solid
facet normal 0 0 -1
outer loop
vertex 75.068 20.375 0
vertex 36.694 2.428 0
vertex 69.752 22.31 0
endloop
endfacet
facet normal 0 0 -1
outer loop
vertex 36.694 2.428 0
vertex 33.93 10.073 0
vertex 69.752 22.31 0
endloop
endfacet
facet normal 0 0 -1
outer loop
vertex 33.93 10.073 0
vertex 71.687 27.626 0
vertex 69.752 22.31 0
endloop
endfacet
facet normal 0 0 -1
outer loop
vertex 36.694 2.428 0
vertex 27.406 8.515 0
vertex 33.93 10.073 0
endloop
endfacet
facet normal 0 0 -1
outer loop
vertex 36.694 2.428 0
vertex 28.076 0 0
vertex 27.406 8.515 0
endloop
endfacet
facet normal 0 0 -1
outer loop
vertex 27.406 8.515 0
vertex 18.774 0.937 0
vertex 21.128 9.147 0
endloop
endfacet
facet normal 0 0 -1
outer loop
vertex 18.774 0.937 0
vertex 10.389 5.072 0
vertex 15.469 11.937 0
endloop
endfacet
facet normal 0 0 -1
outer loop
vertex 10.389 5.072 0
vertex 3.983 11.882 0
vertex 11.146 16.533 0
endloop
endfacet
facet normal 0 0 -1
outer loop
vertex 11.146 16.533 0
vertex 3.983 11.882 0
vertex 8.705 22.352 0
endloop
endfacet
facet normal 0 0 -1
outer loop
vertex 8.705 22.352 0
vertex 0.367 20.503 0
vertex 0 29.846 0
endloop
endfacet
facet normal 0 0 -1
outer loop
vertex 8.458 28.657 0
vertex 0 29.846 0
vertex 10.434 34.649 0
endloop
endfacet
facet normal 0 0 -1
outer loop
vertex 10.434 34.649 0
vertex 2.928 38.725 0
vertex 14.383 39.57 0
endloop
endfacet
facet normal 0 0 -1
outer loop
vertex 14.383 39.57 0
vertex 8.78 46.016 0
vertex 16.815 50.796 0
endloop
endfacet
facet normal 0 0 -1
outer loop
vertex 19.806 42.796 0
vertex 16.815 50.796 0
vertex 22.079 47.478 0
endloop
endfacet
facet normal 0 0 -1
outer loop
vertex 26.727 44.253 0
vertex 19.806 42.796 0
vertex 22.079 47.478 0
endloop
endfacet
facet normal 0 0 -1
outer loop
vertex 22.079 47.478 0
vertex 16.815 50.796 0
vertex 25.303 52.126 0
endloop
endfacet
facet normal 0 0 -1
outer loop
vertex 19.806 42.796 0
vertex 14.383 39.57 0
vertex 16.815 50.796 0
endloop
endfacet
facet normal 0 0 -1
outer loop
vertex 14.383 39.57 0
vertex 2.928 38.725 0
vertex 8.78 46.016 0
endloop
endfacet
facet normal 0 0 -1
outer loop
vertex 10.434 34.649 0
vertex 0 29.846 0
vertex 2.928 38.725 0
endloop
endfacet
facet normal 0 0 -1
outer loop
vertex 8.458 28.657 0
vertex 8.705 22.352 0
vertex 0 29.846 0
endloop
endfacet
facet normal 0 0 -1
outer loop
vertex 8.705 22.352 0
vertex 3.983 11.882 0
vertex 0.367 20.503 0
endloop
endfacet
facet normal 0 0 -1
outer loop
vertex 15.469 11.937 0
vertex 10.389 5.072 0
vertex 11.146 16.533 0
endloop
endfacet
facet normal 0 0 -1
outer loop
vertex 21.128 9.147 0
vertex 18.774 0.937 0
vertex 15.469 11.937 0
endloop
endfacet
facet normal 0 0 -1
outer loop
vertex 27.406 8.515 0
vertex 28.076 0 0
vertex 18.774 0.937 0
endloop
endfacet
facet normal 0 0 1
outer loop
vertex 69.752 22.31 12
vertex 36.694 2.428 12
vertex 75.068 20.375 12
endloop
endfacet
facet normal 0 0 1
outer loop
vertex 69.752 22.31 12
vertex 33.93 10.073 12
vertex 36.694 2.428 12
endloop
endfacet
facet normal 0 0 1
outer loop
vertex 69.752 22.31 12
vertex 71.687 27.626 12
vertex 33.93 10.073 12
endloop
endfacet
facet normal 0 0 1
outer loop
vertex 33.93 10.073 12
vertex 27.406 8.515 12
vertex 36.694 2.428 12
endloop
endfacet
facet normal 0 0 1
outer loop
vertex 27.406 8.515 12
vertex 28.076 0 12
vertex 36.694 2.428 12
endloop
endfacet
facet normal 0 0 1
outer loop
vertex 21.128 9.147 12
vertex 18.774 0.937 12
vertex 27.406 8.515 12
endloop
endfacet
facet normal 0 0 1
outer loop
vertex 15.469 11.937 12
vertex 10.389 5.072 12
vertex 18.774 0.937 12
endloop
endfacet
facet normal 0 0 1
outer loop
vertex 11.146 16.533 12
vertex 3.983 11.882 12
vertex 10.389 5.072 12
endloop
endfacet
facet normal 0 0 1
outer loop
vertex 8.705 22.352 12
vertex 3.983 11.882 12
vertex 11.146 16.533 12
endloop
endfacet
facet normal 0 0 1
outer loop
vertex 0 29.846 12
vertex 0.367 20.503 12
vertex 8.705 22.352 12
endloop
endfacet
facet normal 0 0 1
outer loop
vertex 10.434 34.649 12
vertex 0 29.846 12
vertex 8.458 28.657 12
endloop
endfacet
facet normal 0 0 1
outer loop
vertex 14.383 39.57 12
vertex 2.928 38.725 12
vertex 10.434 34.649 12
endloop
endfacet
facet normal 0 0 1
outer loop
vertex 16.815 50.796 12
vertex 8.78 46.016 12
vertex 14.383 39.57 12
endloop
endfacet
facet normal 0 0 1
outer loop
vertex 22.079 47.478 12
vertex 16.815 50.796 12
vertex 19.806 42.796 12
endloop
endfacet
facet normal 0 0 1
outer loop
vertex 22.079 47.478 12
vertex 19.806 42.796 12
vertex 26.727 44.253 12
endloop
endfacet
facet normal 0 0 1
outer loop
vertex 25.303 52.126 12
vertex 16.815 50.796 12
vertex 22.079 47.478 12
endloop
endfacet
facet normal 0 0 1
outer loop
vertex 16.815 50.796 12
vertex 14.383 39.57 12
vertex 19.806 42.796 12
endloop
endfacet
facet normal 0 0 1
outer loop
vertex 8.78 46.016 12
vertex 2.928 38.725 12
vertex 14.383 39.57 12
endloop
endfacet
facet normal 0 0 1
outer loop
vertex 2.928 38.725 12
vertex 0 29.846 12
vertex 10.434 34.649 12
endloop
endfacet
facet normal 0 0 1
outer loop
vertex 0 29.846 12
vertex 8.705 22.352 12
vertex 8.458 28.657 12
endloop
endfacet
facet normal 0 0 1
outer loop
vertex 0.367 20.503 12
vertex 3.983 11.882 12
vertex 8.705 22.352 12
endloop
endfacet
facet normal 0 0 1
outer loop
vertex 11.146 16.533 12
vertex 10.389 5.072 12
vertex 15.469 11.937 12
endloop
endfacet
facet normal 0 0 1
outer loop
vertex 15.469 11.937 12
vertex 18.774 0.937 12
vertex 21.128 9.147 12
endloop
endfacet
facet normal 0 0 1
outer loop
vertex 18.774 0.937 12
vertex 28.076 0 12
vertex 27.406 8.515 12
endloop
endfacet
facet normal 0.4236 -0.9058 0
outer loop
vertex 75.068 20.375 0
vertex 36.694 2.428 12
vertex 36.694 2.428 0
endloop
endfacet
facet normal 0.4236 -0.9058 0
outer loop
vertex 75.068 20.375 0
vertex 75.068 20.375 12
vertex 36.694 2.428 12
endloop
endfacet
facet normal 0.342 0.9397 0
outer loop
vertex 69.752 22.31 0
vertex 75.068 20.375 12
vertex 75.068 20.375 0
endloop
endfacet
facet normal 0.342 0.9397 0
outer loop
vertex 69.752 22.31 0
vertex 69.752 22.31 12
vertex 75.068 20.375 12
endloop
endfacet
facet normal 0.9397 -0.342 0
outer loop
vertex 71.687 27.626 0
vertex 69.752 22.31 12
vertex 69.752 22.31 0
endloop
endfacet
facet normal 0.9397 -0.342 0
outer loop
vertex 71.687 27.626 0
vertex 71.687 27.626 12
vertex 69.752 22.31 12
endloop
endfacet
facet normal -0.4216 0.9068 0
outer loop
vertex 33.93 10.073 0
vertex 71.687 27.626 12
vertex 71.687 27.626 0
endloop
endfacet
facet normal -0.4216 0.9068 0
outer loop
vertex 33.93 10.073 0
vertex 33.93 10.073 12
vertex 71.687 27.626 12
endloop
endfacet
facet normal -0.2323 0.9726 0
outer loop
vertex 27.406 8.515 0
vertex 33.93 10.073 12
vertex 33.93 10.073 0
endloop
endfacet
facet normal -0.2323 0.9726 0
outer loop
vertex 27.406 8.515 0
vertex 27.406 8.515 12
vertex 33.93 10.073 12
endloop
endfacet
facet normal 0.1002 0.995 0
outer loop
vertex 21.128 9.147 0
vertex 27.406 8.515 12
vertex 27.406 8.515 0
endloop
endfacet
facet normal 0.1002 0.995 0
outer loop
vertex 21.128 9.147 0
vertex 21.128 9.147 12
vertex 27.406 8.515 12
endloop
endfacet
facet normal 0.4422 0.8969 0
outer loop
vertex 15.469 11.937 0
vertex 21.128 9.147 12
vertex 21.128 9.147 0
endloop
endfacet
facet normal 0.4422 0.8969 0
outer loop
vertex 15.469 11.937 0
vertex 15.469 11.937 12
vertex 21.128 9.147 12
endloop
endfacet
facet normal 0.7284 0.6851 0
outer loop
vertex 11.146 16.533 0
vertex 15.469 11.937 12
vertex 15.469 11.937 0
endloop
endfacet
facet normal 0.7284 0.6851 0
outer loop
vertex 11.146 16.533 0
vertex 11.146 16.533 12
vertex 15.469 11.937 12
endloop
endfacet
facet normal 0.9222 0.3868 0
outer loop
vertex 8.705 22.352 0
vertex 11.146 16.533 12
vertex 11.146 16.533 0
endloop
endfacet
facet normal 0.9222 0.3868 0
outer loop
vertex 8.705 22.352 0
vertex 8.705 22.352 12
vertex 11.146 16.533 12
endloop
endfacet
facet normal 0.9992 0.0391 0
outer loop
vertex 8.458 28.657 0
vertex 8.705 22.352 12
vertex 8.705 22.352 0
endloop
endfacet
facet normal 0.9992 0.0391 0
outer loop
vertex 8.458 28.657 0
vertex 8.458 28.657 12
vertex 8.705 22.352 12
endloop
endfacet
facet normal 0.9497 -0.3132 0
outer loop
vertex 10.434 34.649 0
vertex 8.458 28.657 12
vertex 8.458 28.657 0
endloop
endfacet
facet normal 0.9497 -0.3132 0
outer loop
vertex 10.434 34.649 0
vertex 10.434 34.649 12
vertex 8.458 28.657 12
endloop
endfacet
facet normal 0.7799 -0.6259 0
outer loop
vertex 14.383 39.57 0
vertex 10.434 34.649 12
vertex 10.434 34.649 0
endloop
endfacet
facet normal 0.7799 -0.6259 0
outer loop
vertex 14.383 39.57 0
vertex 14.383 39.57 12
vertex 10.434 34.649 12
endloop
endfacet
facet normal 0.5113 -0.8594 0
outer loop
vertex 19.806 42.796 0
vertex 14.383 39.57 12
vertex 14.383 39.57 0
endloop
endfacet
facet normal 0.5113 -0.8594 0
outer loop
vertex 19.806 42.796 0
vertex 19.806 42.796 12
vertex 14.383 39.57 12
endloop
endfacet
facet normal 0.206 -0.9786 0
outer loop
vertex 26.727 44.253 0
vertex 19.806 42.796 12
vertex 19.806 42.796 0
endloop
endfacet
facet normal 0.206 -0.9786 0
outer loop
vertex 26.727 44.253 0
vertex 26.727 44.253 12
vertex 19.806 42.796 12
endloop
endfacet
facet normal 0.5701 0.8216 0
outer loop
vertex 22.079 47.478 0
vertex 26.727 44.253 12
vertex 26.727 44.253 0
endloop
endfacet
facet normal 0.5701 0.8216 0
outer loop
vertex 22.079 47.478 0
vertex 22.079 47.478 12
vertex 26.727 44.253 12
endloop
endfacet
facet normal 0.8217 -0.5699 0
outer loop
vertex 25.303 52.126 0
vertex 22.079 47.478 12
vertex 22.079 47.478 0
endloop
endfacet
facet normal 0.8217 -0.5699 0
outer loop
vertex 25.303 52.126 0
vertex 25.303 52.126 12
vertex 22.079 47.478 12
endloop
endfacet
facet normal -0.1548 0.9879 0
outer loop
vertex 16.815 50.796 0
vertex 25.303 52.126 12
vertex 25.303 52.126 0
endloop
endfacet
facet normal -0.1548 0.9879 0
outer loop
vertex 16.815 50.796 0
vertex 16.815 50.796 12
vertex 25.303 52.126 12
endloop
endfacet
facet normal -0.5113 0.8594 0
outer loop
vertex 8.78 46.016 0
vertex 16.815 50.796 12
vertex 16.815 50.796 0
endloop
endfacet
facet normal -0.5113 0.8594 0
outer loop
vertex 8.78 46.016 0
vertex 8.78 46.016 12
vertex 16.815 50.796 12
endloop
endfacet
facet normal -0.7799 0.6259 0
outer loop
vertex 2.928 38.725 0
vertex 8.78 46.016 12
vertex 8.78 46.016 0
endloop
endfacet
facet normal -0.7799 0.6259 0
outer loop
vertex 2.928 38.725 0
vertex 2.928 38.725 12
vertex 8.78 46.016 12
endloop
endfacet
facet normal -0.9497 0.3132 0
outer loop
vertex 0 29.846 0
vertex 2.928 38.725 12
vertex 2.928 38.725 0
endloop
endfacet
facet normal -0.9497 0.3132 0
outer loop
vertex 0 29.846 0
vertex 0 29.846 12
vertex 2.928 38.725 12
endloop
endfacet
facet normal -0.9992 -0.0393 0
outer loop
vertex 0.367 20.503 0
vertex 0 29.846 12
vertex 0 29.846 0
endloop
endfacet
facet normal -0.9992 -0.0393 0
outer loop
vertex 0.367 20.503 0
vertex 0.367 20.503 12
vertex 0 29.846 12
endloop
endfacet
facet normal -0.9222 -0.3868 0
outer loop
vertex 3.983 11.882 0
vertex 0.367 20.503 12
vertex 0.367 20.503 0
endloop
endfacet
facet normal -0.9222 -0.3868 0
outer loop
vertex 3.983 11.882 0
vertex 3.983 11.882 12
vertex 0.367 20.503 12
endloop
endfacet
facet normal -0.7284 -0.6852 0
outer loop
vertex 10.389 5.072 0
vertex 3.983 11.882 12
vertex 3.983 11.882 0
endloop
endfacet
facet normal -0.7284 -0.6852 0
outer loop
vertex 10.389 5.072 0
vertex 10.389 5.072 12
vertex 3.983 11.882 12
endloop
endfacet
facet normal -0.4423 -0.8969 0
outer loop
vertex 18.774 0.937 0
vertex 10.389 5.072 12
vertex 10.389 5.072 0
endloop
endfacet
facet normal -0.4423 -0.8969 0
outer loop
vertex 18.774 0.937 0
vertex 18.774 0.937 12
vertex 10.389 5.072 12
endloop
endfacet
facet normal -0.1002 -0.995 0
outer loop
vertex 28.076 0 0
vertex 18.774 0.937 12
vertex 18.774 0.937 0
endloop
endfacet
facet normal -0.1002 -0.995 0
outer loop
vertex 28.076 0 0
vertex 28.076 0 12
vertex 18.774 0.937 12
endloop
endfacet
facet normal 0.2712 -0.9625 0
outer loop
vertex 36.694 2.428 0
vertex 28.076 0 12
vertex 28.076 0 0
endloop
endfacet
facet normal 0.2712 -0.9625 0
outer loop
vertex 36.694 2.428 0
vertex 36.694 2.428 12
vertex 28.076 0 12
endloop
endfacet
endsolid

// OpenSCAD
$fn = 32;

// ----------------------------------------------------------------------
// Hook plate: curl radius 22 mm over 205 degrees, 8 mm thick band
// ----------------------------------------------------------------------

// --- parameters (mm) ---
profile_height = 12;      // extrusion height
profile_points = 26;      // points of the closed outline

profile = [[22.079, 47.478], [25.303, 52.126], [16.815, 50.796], [8.78, 46.016], [2.928, 38.725], [0, 29.846], [0.367, 20.503], [3.983, 11.882], [10.389, 5.072], [18.774, 0.937], [28.076, 0], [36.694, 2.428], [75.068, 20.375], [69.752, 22.31], [71.687, 27.626], [33.93, 10.073], [27.406, 8.515], [21.128, 9.147], [15.469, 11.937], [11.146, 16.533], [8.705, 22.352], [8.458, 28.657], [10.434, 34.649], [14.383, 39.57], [19.806, 42.796], [26.727, 44.253]];  // single closed polygon, 26 points, counter clockwise

// --- the one profile operation ---
linear_extrude(height = profile_height) polygon(points = profile);
